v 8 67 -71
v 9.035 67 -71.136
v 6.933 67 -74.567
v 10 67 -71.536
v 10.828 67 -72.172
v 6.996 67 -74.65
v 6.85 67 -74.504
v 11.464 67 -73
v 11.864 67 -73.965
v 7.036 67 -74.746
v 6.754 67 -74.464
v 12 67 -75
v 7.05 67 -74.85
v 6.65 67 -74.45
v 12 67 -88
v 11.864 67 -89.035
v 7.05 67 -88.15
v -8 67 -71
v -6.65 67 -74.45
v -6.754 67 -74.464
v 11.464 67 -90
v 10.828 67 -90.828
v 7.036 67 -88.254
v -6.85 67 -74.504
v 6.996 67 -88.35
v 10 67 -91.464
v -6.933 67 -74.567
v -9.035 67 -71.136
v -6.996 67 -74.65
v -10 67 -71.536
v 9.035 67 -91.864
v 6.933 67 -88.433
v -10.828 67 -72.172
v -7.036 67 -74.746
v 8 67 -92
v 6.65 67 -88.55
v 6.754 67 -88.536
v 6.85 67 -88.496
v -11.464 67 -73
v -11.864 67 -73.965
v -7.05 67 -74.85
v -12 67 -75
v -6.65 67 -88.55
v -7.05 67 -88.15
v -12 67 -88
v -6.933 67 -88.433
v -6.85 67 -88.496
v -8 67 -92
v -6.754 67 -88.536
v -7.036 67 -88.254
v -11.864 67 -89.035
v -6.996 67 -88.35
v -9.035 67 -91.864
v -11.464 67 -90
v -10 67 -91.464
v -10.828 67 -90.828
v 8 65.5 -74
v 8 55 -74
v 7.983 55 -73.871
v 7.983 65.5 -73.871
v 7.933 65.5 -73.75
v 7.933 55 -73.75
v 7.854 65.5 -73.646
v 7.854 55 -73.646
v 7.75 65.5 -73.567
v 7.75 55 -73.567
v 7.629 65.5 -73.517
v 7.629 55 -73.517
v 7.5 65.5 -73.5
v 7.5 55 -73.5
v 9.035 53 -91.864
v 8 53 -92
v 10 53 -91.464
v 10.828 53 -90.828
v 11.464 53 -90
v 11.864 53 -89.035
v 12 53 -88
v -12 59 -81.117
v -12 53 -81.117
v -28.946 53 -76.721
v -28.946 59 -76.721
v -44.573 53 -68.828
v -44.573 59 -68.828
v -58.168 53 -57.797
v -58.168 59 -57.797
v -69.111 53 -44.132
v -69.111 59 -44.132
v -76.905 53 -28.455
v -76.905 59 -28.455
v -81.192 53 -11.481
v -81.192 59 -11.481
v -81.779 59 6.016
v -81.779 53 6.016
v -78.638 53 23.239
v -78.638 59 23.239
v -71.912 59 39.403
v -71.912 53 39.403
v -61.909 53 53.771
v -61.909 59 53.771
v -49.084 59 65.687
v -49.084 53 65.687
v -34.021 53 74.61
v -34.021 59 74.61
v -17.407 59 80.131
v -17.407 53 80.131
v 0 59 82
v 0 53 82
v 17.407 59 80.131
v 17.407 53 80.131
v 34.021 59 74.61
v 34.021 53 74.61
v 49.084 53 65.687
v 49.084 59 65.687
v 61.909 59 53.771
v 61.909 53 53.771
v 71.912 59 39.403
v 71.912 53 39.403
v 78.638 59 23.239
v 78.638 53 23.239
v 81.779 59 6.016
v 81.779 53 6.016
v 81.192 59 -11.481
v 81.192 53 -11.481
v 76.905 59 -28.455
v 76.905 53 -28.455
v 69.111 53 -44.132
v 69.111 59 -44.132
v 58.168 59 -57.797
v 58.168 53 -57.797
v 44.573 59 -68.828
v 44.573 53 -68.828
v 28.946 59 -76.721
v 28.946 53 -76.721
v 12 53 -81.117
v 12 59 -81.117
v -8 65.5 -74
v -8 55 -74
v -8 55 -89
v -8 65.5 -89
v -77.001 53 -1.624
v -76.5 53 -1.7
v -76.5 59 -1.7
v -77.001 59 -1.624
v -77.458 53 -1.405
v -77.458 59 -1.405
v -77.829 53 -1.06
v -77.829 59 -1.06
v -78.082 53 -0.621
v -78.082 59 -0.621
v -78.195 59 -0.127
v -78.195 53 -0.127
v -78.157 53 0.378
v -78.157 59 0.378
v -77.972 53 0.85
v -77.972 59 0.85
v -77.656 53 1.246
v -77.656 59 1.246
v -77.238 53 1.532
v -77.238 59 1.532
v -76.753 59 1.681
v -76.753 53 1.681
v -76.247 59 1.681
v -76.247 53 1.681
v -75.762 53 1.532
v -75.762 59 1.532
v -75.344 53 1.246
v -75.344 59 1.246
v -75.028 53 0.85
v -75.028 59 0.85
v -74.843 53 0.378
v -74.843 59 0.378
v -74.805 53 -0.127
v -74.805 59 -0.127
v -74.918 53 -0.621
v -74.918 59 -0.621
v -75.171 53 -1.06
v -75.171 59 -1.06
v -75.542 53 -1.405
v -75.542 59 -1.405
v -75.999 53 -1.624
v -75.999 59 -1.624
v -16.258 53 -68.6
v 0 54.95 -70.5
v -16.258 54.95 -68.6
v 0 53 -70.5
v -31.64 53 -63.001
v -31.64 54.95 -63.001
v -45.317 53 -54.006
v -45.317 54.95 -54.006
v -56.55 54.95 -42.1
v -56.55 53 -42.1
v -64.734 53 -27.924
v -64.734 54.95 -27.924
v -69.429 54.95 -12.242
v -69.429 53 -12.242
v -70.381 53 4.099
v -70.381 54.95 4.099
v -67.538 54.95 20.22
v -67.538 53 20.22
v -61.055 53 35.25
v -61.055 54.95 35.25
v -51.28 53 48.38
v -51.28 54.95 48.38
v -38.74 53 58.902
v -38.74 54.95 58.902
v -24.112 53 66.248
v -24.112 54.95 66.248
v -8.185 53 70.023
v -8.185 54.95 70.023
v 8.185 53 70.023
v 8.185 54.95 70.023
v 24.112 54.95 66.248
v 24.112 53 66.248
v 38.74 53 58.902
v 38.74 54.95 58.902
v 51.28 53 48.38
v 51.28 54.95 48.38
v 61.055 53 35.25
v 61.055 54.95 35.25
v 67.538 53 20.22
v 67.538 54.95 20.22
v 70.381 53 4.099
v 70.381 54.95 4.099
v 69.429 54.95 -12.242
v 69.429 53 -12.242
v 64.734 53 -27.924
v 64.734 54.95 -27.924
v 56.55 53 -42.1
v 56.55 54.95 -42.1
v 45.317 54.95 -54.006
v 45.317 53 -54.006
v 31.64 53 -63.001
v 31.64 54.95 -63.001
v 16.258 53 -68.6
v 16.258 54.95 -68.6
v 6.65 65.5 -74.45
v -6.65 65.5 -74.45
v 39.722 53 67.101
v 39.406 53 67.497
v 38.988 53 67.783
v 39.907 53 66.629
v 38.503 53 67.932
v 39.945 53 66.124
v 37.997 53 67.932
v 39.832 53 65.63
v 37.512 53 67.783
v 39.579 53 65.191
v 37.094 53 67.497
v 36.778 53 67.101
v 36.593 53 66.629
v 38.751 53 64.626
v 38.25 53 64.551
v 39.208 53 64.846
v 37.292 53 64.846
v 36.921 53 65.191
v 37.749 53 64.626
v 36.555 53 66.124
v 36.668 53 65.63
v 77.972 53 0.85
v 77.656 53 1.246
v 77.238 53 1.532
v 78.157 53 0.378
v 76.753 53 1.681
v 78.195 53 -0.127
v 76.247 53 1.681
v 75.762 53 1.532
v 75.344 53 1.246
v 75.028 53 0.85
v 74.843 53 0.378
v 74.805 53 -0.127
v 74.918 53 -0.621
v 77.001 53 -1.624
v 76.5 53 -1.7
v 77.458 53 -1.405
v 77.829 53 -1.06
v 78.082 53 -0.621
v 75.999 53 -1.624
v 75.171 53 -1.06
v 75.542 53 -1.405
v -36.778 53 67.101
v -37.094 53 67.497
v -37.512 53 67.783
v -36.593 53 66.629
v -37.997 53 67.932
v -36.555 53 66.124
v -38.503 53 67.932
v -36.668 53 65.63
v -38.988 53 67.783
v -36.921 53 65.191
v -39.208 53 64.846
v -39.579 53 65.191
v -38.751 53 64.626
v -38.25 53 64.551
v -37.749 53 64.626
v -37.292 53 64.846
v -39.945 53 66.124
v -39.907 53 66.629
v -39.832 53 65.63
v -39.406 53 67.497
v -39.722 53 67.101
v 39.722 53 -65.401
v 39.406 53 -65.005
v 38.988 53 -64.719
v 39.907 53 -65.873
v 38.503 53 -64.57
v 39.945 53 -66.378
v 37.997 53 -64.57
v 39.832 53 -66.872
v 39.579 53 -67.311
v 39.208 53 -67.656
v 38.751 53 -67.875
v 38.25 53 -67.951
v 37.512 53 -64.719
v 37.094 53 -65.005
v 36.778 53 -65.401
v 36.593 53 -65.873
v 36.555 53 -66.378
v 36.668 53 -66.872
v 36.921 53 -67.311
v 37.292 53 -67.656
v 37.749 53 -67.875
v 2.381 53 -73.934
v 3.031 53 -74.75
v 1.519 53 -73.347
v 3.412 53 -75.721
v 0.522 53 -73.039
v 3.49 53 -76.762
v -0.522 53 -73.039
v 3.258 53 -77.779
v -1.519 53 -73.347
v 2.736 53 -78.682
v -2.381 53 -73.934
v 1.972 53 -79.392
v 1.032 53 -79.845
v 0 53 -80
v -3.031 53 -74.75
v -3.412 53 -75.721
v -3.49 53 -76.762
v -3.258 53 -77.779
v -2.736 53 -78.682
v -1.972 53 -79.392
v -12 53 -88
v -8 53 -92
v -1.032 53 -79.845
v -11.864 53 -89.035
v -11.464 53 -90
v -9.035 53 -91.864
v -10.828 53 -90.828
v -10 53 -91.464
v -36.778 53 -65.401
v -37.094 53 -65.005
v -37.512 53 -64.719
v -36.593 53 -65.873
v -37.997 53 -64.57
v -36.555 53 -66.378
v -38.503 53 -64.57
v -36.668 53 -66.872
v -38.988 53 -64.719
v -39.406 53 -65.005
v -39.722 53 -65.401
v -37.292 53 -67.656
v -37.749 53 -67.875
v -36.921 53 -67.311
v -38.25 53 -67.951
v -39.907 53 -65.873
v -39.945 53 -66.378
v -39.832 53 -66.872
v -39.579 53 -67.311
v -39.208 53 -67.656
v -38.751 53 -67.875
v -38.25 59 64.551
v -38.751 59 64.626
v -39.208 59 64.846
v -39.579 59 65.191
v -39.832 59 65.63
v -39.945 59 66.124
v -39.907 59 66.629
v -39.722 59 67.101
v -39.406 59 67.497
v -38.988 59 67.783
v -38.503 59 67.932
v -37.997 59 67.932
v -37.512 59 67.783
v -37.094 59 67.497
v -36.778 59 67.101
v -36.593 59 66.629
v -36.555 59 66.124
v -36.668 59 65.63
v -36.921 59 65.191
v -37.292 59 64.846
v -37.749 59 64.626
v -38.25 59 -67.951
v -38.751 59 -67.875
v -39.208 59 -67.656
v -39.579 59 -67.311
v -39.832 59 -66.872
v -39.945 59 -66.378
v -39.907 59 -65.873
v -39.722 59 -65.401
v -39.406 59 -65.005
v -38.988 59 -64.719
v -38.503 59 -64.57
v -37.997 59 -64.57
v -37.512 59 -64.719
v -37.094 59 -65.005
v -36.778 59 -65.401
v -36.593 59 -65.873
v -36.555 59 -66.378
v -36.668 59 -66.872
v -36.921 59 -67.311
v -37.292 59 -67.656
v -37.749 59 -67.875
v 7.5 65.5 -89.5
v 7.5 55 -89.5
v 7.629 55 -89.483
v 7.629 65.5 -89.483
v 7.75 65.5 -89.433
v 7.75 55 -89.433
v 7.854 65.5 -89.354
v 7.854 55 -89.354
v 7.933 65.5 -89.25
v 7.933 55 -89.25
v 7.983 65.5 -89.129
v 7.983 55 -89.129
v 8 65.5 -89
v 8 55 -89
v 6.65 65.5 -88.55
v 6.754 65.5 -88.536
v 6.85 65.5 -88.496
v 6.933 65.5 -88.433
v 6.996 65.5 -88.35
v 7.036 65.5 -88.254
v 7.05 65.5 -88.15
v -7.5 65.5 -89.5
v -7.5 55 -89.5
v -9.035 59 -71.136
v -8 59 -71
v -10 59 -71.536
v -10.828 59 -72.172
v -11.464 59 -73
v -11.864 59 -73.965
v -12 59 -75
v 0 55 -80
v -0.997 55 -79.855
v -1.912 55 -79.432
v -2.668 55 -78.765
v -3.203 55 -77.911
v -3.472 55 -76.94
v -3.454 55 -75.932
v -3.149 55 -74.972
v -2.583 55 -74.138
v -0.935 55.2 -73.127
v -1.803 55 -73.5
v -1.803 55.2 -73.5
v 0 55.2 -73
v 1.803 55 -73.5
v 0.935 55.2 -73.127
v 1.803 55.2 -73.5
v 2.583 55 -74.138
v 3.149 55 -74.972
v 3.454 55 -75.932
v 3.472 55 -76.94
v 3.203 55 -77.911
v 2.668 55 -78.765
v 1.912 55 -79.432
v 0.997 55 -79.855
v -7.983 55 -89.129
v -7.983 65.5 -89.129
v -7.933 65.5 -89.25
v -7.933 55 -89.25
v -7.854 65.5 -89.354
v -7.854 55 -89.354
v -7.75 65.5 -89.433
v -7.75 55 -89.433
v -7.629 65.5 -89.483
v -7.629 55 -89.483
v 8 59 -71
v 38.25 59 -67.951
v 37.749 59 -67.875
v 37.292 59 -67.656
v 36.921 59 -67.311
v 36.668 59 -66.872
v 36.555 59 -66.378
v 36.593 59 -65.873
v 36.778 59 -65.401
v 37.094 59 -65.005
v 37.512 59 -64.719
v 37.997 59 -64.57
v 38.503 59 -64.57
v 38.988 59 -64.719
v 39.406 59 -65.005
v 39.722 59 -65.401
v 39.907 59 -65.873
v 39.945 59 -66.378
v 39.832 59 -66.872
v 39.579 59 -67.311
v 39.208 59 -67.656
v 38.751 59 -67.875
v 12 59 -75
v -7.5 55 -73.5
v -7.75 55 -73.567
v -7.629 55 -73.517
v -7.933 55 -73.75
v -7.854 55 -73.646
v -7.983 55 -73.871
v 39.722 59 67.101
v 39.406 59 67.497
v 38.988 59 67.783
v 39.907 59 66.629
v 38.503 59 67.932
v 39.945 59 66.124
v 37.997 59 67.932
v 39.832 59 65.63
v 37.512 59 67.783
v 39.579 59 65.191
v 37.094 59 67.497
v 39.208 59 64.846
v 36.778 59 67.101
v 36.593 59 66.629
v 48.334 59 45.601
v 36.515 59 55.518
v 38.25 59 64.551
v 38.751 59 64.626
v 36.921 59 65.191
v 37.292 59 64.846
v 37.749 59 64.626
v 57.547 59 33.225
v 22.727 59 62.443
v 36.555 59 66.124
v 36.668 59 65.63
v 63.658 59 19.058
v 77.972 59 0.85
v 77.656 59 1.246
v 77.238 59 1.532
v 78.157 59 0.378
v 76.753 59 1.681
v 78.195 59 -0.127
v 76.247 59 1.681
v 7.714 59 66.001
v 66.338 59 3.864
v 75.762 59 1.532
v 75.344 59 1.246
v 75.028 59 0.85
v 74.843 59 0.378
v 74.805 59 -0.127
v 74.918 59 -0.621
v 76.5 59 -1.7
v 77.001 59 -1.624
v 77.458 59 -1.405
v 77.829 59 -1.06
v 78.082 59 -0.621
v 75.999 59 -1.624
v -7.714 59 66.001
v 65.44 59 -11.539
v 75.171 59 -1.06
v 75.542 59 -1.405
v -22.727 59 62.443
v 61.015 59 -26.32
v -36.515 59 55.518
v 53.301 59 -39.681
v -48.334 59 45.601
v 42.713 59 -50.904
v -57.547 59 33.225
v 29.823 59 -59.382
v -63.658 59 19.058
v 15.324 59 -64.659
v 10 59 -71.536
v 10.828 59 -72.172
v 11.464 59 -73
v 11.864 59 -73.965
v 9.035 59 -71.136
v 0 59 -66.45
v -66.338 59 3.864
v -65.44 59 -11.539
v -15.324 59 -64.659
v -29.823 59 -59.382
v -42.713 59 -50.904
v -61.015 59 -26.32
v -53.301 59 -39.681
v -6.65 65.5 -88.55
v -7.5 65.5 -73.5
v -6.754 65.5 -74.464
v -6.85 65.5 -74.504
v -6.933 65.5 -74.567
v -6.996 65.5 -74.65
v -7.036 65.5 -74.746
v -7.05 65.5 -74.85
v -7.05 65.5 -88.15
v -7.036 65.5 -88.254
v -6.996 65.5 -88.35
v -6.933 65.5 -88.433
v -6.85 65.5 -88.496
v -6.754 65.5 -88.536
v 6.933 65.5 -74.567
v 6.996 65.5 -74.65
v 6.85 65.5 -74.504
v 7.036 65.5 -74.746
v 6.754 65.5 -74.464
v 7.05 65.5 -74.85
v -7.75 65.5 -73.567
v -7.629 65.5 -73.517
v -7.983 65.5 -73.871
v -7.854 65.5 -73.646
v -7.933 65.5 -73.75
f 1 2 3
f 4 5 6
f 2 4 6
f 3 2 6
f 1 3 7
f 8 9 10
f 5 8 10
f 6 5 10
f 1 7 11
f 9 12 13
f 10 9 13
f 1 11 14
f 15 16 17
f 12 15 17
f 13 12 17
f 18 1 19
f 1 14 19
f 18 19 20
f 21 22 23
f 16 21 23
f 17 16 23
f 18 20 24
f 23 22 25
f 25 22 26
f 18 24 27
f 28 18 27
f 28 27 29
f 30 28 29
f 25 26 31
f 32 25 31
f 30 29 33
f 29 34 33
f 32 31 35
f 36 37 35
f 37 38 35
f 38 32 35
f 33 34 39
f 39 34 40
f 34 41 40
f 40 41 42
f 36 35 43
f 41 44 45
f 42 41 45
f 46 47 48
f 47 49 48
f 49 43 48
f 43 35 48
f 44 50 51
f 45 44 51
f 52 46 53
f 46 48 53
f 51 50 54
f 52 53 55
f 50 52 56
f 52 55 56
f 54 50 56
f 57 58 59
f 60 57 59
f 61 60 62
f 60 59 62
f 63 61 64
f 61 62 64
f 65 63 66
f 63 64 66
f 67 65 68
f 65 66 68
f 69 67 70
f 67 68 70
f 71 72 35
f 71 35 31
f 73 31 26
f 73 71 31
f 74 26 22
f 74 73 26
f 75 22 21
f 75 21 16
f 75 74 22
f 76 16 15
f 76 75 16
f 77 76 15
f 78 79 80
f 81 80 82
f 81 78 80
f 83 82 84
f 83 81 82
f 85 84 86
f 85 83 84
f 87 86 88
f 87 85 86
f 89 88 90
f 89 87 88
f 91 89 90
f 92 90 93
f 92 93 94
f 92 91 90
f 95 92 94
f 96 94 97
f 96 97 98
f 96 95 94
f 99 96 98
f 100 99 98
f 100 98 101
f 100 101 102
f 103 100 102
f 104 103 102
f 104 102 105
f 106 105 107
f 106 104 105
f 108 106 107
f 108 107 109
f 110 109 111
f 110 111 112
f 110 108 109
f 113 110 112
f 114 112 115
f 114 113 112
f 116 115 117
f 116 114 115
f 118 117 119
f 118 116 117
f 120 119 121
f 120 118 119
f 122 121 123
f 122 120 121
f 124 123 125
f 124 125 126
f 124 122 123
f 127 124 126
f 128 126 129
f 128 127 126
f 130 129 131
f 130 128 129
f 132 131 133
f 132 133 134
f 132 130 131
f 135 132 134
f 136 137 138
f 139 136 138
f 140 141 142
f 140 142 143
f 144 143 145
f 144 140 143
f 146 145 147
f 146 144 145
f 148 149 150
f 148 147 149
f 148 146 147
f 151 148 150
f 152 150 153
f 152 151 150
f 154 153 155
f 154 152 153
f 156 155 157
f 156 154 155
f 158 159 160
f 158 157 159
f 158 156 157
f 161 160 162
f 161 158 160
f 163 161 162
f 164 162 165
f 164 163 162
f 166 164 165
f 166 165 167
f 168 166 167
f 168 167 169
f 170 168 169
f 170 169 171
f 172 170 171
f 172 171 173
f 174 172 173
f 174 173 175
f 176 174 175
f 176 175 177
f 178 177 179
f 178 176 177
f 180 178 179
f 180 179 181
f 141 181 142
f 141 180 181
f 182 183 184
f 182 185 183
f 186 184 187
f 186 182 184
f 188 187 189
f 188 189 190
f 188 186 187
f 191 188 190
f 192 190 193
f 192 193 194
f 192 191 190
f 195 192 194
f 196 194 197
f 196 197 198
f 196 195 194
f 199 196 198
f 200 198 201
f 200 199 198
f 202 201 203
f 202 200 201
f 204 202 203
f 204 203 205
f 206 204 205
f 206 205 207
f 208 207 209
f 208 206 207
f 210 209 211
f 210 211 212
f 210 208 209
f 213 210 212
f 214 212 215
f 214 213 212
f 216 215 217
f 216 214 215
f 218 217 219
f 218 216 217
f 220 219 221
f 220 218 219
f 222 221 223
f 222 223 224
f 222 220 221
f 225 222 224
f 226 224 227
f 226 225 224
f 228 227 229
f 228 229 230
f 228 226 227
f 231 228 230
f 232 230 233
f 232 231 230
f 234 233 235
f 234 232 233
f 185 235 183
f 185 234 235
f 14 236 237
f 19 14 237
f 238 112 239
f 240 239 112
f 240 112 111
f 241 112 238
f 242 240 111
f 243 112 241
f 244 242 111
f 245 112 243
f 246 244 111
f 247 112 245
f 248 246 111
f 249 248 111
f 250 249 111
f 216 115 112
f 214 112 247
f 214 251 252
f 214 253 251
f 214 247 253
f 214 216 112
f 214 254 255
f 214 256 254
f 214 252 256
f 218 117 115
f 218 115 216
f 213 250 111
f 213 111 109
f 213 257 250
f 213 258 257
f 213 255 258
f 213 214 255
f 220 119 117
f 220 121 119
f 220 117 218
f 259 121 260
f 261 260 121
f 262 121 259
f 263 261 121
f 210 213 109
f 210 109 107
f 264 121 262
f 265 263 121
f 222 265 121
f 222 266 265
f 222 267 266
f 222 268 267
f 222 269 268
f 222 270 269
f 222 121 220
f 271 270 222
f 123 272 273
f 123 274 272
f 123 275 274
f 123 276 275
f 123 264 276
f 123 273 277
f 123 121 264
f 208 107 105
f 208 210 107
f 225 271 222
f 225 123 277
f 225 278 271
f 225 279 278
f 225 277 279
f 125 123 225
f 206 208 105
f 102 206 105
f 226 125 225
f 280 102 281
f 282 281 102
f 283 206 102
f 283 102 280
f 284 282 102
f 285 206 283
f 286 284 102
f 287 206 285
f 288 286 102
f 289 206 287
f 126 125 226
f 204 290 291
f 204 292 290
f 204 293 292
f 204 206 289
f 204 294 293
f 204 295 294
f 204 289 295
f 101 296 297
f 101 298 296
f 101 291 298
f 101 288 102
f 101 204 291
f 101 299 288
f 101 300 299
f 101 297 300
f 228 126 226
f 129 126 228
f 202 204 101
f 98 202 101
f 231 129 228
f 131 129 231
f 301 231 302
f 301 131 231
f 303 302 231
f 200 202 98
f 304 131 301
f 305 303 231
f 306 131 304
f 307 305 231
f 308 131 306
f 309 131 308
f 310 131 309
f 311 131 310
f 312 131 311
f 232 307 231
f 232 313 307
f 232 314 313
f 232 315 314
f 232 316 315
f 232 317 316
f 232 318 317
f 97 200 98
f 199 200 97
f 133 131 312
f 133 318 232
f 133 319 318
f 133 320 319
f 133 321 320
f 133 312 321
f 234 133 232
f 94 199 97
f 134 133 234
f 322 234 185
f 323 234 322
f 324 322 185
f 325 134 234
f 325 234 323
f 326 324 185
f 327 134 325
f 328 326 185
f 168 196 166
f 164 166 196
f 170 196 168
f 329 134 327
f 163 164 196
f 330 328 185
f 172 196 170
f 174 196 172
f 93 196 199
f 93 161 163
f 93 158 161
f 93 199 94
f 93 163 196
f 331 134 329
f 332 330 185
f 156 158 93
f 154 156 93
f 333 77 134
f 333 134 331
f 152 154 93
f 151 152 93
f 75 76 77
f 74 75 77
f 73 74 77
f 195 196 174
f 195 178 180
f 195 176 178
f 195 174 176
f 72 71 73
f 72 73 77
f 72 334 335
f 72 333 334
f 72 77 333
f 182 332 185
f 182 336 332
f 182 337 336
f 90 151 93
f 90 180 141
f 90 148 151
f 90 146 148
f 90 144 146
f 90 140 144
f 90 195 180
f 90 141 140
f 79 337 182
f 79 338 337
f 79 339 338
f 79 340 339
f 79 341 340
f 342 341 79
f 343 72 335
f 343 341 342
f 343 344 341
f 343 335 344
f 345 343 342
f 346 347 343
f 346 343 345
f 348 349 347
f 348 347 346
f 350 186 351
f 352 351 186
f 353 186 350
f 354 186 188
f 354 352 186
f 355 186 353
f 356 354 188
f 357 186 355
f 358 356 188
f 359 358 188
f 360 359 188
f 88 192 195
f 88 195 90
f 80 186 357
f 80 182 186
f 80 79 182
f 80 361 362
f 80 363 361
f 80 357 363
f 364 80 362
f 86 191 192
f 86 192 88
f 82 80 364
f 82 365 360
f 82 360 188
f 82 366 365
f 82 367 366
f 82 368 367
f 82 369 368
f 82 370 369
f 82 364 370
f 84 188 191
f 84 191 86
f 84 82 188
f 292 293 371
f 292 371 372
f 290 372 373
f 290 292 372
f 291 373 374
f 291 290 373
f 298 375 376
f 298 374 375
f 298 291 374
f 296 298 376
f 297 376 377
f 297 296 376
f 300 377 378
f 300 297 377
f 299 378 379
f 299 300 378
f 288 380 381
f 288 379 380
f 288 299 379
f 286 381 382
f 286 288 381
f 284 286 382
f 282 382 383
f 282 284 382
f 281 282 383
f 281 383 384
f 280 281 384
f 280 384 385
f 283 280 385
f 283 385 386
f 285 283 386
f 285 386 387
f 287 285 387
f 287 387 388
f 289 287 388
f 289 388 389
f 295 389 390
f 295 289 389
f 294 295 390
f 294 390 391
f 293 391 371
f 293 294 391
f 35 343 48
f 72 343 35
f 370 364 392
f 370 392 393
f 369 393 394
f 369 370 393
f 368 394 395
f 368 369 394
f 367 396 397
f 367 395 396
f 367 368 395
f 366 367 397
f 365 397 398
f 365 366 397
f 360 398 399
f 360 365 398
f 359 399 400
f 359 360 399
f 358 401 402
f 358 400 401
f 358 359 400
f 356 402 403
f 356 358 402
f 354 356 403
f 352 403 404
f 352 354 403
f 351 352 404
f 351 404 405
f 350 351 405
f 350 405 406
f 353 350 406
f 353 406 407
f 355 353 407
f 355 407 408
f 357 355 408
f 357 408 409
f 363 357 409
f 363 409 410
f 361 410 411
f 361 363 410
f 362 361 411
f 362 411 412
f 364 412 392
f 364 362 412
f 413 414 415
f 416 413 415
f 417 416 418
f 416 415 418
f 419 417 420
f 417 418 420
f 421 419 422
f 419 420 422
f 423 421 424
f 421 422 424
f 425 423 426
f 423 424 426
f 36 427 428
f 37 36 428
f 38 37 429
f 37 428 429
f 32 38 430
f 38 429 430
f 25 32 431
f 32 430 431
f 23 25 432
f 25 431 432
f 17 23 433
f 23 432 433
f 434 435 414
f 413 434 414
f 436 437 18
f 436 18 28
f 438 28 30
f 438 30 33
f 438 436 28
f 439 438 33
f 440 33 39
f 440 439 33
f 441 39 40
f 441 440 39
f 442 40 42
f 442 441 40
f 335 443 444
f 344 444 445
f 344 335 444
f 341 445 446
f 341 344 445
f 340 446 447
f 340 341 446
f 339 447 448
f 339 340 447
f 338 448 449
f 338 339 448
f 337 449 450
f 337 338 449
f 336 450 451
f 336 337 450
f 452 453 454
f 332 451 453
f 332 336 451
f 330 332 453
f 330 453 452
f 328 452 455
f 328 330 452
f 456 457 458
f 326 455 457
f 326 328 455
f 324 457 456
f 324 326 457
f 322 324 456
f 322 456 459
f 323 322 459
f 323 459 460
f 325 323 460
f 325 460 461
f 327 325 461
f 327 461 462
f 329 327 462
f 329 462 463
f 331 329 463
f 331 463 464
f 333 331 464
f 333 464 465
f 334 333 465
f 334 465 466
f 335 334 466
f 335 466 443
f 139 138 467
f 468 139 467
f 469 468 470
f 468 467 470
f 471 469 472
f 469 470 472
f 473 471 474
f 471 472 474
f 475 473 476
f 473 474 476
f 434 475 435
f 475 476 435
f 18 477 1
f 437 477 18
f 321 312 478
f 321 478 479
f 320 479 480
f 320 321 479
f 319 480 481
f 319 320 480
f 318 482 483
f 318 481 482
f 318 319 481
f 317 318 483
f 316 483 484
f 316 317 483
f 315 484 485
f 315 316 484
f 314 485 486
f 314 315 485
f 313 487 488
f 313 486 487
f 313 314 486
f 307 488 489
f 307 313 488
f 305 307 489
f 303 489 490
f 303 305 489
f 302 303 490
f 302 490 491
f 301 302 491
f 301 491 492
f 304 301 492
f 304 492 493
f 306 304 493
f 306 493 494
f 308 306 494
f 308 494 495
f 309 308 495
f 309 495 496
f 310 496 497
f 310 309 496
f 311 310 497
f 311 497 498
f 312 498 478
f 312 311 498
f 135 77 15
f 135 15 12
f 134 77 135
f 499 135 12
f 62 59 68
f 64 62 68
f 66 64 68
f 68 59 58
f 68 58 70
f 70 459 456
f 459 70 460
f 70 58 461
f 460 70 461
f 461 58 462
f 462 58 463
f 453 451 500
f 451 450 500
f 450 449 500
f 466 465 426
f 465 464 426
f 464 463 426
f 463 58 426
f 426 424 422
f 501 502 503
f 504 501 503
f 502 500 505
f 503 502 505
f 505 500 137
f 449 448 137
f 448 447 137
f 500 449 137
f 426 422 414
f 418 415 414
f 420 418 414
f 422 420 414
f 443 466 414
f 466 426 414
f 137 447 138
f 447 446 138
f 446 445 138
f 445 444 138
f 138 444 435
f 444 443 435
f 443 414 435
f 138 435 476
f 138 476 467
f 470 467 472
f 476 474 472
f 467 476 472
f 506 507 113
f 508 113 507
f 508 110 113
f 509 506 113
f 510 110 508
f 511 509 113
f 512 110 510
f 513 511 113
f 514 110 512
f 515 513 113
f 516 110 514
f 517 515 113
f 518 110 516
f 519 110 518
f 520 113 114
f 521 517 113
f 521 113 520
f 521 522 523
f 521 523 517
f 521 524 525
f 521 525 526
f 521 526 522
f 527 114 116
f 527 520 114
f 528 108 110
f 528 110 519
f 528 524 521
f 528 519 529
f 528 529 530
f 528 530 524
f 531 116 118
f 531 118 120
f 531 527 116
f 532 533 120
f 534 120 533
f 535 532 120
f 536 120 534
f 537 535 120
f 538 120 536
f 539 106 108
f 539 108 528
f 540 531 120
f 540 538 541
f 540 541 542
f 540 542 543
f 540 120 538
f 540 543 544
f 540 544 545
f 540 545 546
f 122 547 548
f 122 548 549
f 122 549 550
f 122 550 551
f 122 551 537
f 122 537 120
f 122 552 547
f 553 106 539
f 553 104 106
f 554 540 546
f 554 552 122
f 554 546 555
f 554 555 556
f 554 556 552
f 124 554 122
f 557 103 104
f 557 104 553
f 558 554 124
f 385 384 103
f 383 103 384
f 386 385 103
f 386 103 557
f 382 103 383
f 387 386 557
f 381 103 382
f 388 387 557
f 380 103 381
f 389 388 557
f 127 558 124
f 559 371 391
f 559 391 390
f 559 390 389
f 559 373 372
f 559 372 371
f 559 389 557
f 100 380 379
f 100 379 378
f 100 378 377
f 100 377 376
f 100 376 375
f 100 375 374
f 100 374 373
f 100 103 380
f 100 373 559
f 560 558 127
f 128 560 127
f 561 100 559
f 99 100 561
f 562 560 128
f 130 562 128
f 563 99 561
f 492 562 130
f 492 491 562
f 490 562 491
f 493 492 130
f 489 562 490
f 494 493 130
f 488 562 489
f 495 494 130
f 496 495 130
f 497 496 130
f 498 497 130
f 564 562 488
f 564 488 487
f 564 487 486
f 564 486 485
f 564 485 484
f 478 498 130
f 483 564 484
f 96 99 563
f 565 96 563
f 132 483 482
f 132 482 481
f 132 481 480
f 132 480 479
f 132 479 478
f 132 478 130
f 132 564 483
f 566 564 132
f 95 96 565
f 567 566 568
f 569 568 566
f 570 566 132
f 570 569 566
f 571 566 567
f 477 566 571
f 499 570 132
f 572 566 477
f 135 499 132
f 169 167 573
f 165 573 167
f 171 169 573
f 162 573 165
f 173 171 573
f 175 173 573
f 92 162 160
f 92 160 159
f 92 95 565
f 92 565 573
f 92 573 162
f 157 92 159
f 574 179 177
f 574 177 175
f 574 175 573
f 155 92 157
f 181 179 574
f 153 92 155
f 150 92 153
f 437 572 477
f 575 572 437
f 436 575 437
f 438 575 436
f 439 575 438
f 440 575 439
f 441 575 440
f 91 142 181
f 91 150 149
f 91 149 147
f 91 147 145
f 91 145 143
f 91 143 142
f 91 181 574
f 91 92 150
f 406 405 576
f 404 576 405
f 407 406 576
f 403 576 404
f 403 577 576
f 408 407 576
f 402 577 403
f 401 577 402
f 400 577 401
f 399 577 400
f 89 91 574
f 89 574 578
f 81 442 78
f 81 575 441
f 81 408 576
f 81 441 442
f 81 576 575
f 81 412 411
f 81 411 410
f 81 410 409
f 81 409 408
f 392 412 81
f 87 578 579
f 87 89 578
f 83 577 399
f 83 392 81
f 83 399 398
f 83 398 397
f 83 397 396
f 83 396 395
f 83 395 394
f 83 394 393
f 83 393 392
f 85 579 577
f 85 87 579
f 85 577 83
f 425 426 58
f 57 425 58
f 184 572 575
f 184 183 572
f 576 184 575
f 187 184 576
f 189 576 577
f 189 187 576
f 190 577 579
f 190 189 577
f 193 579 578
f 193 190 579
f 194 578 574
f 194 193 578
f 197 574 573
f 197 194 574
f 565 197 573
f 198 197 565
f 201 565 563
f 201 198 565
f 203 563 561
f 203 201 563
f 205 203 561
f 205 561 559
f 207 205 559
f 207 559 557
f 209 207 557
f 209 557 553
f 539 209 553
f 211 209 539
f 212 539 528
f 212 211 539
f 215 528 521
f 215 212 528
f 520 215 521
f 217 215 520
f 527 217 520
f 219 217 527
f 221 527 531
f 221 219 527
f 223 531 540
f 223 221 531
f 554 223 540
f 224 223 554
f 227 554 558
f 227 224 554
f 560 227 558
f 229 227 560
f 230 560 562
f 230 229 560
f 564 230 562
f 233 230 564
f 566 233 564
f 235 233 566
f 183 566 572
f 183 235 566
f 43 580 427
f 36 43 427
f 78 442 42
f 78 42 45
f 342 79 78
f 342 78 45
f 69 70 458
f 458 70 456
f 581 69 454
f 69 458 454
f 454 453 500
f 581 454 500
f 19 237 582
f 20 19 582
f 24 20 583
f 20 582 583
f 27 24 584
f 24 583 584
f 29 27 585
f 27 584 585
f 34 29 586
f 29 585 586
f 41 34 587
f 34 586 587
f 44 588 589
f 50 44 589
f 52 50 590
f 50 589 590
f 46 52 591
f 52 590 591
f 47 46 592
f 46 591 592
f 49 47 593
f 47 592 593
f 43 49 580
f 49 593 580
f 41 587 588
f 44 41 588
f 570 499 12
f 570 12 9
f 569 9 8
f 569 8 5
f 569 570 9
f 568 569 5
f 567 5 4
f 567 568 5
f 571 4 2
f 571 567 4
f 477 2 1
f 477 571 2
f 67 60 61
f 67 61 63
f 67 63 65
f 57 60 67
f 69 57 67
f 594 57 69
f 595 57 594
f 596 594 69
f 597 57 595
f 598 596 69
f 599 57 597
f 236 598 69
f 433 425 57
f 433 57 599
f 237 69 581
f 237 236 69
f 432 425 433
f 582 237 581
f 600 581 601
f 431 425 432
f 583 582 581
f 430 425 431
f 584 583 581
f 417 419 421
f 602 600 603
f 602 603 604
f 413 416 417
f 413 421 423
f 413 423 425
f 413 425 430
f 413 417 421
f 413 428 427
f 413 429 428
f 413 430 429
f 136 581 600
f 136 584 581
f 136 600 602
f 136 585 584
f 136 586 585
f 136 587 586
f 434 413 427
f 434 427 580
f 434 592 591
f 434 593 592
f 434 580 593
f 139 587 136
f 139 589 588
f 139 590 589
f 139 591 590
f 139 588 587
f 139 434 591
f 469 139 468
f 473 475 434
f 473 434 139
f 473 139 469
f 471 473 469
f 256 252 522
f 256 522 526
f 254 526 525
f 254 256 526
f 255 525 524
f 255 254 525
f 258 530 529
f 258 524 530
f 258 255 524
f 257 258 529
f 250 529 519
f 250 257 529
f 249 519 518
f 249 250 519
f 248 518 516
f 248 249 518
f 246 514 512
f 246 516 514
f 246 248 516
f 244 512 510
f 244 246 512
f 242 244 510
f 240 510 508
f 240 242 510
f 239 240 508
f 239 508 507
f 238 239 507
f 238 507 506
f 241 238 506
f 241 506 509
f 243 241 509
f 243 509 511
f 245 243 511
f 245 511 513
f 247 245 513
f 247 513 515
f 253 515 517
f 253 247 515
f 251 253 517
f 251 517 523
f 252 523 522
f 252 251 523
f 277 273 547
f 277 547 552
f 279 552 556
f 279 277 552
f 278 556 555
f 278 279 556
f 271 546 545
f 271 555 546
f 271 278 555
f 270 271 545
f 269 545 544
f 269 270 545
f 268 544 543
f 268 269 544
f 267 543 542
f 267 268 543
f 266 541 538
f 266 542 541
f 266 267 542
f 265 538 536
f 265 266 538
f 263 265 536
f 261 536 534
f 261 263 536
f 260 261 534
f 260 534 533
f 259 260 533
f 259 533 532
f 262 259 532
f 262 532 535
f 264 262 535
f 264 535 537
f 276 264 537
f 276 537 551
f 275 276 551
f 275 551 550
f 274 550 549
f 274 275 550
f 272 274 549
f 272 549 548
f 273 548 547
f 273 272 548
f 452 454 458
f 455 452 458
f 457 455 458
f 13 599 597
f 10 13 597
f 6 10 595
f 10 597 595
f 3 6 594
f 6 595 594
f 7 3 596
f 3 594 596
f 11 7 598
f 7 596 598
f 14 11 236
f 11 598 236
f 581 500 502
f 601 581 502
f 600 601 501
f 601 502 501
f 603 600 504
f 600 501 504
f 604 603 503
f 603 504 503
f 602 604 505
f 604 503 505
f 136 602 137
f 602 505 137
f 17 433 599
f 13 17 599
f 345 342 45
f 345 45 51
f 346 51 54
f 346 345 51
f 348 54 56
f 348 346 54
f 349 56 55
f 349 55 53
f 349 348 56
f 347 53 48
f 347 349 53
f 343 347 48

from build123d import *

# Parameters (mm, degrees)
MX_START           = 53
MX_POD_DEPTH       = 14
MX_START_2         = 65.5
MX_CUTOUT_DEPTH    = 1.7
MX_START_3         = 55
MX_RELIEF_DEPTH    = 10.5
MX_START_4         = 52.8
SKETCH5_R          = 3.5
MX_LEAD_HOLE_DEPTH = 2.4
BOLT_START         = 52.8
SKETCH6_R          = 1.7
BOLT_HOLES_DEPTH   = 6.4


with BuildPart() as part:
    # Sketch1 → Lip ring (revolve)
    with BuildSketch(Plane.XY, mode=Mode.PRIVATE) as lip_ring_sk:
        Polygon((70.5, 53), (82, 53), (82, 59), (66.45, 59), (70.5, 54.95), align=None)
    revolve(lip_ring_sk.sketch.rotate(Axis((0, 40, 0), (0, 1, 0)), 90), axis=Axis((0, 40, 0), (0, 1, 0)))

    # Sketch2 → MX pod (add)
    with BuildSketch(Plane(origin=(0, 0, 0), x_dir=(1, 0, 0), z_dir=(0, 1, 0)).offset(MX_START)):
        with BuildLine():
            Line((-8, 92), (8, 92))
            ThreePointArc((8, 92), (10.828427125, 90.828427125), (12, 88))
            Line((12, 88), (12, 75))
            ThreePointArc((12, 75), (10.828427125, 72.171572875), (8, 71))
            Line((8, 71), (-8, 71))
            ThreePointArc((-8, 71), (-10.828427125, 72.171572875), (-12, 75))
            Line((-12, 75), (-12, 88))
            ThreePointArc((-12, 88), (-10.828427125, 90.828427125), (-8, 92))
        make_face()
    extrude(amount=MX_POD_DEPTH)

    # Sketch3 → MX cutout (cut)
    with BuildSketch(Plane(origin=(0, 0, 0), x_dir=(1, 0, 0), z_dir=(0, 1, 0)).offset(MX_START_2)):
        with BuildLine():
            Line((-6.65, 88.55), (6.65, 88.55))
            ThreePointArc((6.65, 88.55), (6.932842712, 88.432842712), (7.05, 88.15))
            Line((7.05, 88.15), (7.05, 74.85))
            ThreePointArc((7.05, 74.85), (6.932842712, 74.567157288), (6.65, 74.45))
            Line((6.65, 74.45), (-6.65, 74.45))
            ThreePointArc((-6.65, 74.45), (-6.932842712, 74.567157288), (-7.05, 74.85))
            Line((-7.05, 74.85), (-7.05, 88.15))
            ThreePointArc((-7.05, 88.15), (-6.932842712, 88.432842712), (-6.65, 88.55))
        make_face()
    extrude(amount=MX_CUTOUT_DEPTH, mode=Mode.SUBTRACT)

    # Sketch4 → MX relief (cut)
    with BuildSketch(Plane(origin=(0, 0, 0), x_dir=(1, 0, 0), z_dir=(0, 1, 0)).offset(MX_START_3)):
        with BuildLine():
            Line((-7.5, 89.5), (7.5, 89.5))
            ThreePointArc((7.5, 89.5), (7.853553391, 89.353553391), (8, 89))
            Line((8, 89), (8, 74))
            ThreePointArc((8, 74), (7.853553391, 73.646446609), (7.5, 73.5))
            Line((7.5, 73.5), (-7.5, 73.5))
            ThreePointArc((-7.5, 73.5), (-7.853553391, 73.646446609), (-8, 74))
            Line((-8, 74), (-8, 89))
            ThreePointArc((-8, 89), (-7.853553391, 89.353553391), (-7.5, 89.5))
        make_face()
    extrude(amount=MX_RELIEF_DEPTH, mode=Mode.SUBTRACT)

    # Sketch5 → MX lead hole (cut)
    with BuildSketch(Plane(origin=(0, 0, 0), x_dir=(1, 0, 0), z_dir=(0, 1, 0)).offset(MX_START_4)):
        with Locations(Location((0, 76.5, 0), (0, 0, 90))):
            Circle(SKETCH5_R)
    extrude(amount=MX_LEAD_HOLE_DEPTH, mode=Mode.SUBTRACT)

    # Sketch6 → Bolt holes (cut)
    with BuildSketch(Plane(origin=(0, 0, 0), x_dir=(1, 0, 0), z_dir=(0, 1, 0)).offset(BOLT_START)):
        with Locations(Location((76.5, 0, 0), (0, 0, 90))):
            Circle(SKETCH6_R)
        with Locations(Location((38.25, -66.25094339, 0), (0, 0, 90))):
            Circle(SKETCH6_R)
        with Locations(Location((-38.25, -66.25094339, 0), (0, 0, 90))):
            Circle(SKETCH6_R)
        with Locations(Location((-76.5, 0, 0), (0, 0, 90))):
            Circle(SKETCH6_R)
        with Locations(Location((-38.25, 66.25094339, 0), (0, 0, 90))):
            Circle(SKETCH6_R)
        with Locations(Location((38.25, 66.25094339, 0), (0, 0, 90))):
            Circle(SKETCH6_R)
    extrude(amount=BOLT_HOLES_DEPTH, mode=Mode.SUBTRACT)


solid = part.part
